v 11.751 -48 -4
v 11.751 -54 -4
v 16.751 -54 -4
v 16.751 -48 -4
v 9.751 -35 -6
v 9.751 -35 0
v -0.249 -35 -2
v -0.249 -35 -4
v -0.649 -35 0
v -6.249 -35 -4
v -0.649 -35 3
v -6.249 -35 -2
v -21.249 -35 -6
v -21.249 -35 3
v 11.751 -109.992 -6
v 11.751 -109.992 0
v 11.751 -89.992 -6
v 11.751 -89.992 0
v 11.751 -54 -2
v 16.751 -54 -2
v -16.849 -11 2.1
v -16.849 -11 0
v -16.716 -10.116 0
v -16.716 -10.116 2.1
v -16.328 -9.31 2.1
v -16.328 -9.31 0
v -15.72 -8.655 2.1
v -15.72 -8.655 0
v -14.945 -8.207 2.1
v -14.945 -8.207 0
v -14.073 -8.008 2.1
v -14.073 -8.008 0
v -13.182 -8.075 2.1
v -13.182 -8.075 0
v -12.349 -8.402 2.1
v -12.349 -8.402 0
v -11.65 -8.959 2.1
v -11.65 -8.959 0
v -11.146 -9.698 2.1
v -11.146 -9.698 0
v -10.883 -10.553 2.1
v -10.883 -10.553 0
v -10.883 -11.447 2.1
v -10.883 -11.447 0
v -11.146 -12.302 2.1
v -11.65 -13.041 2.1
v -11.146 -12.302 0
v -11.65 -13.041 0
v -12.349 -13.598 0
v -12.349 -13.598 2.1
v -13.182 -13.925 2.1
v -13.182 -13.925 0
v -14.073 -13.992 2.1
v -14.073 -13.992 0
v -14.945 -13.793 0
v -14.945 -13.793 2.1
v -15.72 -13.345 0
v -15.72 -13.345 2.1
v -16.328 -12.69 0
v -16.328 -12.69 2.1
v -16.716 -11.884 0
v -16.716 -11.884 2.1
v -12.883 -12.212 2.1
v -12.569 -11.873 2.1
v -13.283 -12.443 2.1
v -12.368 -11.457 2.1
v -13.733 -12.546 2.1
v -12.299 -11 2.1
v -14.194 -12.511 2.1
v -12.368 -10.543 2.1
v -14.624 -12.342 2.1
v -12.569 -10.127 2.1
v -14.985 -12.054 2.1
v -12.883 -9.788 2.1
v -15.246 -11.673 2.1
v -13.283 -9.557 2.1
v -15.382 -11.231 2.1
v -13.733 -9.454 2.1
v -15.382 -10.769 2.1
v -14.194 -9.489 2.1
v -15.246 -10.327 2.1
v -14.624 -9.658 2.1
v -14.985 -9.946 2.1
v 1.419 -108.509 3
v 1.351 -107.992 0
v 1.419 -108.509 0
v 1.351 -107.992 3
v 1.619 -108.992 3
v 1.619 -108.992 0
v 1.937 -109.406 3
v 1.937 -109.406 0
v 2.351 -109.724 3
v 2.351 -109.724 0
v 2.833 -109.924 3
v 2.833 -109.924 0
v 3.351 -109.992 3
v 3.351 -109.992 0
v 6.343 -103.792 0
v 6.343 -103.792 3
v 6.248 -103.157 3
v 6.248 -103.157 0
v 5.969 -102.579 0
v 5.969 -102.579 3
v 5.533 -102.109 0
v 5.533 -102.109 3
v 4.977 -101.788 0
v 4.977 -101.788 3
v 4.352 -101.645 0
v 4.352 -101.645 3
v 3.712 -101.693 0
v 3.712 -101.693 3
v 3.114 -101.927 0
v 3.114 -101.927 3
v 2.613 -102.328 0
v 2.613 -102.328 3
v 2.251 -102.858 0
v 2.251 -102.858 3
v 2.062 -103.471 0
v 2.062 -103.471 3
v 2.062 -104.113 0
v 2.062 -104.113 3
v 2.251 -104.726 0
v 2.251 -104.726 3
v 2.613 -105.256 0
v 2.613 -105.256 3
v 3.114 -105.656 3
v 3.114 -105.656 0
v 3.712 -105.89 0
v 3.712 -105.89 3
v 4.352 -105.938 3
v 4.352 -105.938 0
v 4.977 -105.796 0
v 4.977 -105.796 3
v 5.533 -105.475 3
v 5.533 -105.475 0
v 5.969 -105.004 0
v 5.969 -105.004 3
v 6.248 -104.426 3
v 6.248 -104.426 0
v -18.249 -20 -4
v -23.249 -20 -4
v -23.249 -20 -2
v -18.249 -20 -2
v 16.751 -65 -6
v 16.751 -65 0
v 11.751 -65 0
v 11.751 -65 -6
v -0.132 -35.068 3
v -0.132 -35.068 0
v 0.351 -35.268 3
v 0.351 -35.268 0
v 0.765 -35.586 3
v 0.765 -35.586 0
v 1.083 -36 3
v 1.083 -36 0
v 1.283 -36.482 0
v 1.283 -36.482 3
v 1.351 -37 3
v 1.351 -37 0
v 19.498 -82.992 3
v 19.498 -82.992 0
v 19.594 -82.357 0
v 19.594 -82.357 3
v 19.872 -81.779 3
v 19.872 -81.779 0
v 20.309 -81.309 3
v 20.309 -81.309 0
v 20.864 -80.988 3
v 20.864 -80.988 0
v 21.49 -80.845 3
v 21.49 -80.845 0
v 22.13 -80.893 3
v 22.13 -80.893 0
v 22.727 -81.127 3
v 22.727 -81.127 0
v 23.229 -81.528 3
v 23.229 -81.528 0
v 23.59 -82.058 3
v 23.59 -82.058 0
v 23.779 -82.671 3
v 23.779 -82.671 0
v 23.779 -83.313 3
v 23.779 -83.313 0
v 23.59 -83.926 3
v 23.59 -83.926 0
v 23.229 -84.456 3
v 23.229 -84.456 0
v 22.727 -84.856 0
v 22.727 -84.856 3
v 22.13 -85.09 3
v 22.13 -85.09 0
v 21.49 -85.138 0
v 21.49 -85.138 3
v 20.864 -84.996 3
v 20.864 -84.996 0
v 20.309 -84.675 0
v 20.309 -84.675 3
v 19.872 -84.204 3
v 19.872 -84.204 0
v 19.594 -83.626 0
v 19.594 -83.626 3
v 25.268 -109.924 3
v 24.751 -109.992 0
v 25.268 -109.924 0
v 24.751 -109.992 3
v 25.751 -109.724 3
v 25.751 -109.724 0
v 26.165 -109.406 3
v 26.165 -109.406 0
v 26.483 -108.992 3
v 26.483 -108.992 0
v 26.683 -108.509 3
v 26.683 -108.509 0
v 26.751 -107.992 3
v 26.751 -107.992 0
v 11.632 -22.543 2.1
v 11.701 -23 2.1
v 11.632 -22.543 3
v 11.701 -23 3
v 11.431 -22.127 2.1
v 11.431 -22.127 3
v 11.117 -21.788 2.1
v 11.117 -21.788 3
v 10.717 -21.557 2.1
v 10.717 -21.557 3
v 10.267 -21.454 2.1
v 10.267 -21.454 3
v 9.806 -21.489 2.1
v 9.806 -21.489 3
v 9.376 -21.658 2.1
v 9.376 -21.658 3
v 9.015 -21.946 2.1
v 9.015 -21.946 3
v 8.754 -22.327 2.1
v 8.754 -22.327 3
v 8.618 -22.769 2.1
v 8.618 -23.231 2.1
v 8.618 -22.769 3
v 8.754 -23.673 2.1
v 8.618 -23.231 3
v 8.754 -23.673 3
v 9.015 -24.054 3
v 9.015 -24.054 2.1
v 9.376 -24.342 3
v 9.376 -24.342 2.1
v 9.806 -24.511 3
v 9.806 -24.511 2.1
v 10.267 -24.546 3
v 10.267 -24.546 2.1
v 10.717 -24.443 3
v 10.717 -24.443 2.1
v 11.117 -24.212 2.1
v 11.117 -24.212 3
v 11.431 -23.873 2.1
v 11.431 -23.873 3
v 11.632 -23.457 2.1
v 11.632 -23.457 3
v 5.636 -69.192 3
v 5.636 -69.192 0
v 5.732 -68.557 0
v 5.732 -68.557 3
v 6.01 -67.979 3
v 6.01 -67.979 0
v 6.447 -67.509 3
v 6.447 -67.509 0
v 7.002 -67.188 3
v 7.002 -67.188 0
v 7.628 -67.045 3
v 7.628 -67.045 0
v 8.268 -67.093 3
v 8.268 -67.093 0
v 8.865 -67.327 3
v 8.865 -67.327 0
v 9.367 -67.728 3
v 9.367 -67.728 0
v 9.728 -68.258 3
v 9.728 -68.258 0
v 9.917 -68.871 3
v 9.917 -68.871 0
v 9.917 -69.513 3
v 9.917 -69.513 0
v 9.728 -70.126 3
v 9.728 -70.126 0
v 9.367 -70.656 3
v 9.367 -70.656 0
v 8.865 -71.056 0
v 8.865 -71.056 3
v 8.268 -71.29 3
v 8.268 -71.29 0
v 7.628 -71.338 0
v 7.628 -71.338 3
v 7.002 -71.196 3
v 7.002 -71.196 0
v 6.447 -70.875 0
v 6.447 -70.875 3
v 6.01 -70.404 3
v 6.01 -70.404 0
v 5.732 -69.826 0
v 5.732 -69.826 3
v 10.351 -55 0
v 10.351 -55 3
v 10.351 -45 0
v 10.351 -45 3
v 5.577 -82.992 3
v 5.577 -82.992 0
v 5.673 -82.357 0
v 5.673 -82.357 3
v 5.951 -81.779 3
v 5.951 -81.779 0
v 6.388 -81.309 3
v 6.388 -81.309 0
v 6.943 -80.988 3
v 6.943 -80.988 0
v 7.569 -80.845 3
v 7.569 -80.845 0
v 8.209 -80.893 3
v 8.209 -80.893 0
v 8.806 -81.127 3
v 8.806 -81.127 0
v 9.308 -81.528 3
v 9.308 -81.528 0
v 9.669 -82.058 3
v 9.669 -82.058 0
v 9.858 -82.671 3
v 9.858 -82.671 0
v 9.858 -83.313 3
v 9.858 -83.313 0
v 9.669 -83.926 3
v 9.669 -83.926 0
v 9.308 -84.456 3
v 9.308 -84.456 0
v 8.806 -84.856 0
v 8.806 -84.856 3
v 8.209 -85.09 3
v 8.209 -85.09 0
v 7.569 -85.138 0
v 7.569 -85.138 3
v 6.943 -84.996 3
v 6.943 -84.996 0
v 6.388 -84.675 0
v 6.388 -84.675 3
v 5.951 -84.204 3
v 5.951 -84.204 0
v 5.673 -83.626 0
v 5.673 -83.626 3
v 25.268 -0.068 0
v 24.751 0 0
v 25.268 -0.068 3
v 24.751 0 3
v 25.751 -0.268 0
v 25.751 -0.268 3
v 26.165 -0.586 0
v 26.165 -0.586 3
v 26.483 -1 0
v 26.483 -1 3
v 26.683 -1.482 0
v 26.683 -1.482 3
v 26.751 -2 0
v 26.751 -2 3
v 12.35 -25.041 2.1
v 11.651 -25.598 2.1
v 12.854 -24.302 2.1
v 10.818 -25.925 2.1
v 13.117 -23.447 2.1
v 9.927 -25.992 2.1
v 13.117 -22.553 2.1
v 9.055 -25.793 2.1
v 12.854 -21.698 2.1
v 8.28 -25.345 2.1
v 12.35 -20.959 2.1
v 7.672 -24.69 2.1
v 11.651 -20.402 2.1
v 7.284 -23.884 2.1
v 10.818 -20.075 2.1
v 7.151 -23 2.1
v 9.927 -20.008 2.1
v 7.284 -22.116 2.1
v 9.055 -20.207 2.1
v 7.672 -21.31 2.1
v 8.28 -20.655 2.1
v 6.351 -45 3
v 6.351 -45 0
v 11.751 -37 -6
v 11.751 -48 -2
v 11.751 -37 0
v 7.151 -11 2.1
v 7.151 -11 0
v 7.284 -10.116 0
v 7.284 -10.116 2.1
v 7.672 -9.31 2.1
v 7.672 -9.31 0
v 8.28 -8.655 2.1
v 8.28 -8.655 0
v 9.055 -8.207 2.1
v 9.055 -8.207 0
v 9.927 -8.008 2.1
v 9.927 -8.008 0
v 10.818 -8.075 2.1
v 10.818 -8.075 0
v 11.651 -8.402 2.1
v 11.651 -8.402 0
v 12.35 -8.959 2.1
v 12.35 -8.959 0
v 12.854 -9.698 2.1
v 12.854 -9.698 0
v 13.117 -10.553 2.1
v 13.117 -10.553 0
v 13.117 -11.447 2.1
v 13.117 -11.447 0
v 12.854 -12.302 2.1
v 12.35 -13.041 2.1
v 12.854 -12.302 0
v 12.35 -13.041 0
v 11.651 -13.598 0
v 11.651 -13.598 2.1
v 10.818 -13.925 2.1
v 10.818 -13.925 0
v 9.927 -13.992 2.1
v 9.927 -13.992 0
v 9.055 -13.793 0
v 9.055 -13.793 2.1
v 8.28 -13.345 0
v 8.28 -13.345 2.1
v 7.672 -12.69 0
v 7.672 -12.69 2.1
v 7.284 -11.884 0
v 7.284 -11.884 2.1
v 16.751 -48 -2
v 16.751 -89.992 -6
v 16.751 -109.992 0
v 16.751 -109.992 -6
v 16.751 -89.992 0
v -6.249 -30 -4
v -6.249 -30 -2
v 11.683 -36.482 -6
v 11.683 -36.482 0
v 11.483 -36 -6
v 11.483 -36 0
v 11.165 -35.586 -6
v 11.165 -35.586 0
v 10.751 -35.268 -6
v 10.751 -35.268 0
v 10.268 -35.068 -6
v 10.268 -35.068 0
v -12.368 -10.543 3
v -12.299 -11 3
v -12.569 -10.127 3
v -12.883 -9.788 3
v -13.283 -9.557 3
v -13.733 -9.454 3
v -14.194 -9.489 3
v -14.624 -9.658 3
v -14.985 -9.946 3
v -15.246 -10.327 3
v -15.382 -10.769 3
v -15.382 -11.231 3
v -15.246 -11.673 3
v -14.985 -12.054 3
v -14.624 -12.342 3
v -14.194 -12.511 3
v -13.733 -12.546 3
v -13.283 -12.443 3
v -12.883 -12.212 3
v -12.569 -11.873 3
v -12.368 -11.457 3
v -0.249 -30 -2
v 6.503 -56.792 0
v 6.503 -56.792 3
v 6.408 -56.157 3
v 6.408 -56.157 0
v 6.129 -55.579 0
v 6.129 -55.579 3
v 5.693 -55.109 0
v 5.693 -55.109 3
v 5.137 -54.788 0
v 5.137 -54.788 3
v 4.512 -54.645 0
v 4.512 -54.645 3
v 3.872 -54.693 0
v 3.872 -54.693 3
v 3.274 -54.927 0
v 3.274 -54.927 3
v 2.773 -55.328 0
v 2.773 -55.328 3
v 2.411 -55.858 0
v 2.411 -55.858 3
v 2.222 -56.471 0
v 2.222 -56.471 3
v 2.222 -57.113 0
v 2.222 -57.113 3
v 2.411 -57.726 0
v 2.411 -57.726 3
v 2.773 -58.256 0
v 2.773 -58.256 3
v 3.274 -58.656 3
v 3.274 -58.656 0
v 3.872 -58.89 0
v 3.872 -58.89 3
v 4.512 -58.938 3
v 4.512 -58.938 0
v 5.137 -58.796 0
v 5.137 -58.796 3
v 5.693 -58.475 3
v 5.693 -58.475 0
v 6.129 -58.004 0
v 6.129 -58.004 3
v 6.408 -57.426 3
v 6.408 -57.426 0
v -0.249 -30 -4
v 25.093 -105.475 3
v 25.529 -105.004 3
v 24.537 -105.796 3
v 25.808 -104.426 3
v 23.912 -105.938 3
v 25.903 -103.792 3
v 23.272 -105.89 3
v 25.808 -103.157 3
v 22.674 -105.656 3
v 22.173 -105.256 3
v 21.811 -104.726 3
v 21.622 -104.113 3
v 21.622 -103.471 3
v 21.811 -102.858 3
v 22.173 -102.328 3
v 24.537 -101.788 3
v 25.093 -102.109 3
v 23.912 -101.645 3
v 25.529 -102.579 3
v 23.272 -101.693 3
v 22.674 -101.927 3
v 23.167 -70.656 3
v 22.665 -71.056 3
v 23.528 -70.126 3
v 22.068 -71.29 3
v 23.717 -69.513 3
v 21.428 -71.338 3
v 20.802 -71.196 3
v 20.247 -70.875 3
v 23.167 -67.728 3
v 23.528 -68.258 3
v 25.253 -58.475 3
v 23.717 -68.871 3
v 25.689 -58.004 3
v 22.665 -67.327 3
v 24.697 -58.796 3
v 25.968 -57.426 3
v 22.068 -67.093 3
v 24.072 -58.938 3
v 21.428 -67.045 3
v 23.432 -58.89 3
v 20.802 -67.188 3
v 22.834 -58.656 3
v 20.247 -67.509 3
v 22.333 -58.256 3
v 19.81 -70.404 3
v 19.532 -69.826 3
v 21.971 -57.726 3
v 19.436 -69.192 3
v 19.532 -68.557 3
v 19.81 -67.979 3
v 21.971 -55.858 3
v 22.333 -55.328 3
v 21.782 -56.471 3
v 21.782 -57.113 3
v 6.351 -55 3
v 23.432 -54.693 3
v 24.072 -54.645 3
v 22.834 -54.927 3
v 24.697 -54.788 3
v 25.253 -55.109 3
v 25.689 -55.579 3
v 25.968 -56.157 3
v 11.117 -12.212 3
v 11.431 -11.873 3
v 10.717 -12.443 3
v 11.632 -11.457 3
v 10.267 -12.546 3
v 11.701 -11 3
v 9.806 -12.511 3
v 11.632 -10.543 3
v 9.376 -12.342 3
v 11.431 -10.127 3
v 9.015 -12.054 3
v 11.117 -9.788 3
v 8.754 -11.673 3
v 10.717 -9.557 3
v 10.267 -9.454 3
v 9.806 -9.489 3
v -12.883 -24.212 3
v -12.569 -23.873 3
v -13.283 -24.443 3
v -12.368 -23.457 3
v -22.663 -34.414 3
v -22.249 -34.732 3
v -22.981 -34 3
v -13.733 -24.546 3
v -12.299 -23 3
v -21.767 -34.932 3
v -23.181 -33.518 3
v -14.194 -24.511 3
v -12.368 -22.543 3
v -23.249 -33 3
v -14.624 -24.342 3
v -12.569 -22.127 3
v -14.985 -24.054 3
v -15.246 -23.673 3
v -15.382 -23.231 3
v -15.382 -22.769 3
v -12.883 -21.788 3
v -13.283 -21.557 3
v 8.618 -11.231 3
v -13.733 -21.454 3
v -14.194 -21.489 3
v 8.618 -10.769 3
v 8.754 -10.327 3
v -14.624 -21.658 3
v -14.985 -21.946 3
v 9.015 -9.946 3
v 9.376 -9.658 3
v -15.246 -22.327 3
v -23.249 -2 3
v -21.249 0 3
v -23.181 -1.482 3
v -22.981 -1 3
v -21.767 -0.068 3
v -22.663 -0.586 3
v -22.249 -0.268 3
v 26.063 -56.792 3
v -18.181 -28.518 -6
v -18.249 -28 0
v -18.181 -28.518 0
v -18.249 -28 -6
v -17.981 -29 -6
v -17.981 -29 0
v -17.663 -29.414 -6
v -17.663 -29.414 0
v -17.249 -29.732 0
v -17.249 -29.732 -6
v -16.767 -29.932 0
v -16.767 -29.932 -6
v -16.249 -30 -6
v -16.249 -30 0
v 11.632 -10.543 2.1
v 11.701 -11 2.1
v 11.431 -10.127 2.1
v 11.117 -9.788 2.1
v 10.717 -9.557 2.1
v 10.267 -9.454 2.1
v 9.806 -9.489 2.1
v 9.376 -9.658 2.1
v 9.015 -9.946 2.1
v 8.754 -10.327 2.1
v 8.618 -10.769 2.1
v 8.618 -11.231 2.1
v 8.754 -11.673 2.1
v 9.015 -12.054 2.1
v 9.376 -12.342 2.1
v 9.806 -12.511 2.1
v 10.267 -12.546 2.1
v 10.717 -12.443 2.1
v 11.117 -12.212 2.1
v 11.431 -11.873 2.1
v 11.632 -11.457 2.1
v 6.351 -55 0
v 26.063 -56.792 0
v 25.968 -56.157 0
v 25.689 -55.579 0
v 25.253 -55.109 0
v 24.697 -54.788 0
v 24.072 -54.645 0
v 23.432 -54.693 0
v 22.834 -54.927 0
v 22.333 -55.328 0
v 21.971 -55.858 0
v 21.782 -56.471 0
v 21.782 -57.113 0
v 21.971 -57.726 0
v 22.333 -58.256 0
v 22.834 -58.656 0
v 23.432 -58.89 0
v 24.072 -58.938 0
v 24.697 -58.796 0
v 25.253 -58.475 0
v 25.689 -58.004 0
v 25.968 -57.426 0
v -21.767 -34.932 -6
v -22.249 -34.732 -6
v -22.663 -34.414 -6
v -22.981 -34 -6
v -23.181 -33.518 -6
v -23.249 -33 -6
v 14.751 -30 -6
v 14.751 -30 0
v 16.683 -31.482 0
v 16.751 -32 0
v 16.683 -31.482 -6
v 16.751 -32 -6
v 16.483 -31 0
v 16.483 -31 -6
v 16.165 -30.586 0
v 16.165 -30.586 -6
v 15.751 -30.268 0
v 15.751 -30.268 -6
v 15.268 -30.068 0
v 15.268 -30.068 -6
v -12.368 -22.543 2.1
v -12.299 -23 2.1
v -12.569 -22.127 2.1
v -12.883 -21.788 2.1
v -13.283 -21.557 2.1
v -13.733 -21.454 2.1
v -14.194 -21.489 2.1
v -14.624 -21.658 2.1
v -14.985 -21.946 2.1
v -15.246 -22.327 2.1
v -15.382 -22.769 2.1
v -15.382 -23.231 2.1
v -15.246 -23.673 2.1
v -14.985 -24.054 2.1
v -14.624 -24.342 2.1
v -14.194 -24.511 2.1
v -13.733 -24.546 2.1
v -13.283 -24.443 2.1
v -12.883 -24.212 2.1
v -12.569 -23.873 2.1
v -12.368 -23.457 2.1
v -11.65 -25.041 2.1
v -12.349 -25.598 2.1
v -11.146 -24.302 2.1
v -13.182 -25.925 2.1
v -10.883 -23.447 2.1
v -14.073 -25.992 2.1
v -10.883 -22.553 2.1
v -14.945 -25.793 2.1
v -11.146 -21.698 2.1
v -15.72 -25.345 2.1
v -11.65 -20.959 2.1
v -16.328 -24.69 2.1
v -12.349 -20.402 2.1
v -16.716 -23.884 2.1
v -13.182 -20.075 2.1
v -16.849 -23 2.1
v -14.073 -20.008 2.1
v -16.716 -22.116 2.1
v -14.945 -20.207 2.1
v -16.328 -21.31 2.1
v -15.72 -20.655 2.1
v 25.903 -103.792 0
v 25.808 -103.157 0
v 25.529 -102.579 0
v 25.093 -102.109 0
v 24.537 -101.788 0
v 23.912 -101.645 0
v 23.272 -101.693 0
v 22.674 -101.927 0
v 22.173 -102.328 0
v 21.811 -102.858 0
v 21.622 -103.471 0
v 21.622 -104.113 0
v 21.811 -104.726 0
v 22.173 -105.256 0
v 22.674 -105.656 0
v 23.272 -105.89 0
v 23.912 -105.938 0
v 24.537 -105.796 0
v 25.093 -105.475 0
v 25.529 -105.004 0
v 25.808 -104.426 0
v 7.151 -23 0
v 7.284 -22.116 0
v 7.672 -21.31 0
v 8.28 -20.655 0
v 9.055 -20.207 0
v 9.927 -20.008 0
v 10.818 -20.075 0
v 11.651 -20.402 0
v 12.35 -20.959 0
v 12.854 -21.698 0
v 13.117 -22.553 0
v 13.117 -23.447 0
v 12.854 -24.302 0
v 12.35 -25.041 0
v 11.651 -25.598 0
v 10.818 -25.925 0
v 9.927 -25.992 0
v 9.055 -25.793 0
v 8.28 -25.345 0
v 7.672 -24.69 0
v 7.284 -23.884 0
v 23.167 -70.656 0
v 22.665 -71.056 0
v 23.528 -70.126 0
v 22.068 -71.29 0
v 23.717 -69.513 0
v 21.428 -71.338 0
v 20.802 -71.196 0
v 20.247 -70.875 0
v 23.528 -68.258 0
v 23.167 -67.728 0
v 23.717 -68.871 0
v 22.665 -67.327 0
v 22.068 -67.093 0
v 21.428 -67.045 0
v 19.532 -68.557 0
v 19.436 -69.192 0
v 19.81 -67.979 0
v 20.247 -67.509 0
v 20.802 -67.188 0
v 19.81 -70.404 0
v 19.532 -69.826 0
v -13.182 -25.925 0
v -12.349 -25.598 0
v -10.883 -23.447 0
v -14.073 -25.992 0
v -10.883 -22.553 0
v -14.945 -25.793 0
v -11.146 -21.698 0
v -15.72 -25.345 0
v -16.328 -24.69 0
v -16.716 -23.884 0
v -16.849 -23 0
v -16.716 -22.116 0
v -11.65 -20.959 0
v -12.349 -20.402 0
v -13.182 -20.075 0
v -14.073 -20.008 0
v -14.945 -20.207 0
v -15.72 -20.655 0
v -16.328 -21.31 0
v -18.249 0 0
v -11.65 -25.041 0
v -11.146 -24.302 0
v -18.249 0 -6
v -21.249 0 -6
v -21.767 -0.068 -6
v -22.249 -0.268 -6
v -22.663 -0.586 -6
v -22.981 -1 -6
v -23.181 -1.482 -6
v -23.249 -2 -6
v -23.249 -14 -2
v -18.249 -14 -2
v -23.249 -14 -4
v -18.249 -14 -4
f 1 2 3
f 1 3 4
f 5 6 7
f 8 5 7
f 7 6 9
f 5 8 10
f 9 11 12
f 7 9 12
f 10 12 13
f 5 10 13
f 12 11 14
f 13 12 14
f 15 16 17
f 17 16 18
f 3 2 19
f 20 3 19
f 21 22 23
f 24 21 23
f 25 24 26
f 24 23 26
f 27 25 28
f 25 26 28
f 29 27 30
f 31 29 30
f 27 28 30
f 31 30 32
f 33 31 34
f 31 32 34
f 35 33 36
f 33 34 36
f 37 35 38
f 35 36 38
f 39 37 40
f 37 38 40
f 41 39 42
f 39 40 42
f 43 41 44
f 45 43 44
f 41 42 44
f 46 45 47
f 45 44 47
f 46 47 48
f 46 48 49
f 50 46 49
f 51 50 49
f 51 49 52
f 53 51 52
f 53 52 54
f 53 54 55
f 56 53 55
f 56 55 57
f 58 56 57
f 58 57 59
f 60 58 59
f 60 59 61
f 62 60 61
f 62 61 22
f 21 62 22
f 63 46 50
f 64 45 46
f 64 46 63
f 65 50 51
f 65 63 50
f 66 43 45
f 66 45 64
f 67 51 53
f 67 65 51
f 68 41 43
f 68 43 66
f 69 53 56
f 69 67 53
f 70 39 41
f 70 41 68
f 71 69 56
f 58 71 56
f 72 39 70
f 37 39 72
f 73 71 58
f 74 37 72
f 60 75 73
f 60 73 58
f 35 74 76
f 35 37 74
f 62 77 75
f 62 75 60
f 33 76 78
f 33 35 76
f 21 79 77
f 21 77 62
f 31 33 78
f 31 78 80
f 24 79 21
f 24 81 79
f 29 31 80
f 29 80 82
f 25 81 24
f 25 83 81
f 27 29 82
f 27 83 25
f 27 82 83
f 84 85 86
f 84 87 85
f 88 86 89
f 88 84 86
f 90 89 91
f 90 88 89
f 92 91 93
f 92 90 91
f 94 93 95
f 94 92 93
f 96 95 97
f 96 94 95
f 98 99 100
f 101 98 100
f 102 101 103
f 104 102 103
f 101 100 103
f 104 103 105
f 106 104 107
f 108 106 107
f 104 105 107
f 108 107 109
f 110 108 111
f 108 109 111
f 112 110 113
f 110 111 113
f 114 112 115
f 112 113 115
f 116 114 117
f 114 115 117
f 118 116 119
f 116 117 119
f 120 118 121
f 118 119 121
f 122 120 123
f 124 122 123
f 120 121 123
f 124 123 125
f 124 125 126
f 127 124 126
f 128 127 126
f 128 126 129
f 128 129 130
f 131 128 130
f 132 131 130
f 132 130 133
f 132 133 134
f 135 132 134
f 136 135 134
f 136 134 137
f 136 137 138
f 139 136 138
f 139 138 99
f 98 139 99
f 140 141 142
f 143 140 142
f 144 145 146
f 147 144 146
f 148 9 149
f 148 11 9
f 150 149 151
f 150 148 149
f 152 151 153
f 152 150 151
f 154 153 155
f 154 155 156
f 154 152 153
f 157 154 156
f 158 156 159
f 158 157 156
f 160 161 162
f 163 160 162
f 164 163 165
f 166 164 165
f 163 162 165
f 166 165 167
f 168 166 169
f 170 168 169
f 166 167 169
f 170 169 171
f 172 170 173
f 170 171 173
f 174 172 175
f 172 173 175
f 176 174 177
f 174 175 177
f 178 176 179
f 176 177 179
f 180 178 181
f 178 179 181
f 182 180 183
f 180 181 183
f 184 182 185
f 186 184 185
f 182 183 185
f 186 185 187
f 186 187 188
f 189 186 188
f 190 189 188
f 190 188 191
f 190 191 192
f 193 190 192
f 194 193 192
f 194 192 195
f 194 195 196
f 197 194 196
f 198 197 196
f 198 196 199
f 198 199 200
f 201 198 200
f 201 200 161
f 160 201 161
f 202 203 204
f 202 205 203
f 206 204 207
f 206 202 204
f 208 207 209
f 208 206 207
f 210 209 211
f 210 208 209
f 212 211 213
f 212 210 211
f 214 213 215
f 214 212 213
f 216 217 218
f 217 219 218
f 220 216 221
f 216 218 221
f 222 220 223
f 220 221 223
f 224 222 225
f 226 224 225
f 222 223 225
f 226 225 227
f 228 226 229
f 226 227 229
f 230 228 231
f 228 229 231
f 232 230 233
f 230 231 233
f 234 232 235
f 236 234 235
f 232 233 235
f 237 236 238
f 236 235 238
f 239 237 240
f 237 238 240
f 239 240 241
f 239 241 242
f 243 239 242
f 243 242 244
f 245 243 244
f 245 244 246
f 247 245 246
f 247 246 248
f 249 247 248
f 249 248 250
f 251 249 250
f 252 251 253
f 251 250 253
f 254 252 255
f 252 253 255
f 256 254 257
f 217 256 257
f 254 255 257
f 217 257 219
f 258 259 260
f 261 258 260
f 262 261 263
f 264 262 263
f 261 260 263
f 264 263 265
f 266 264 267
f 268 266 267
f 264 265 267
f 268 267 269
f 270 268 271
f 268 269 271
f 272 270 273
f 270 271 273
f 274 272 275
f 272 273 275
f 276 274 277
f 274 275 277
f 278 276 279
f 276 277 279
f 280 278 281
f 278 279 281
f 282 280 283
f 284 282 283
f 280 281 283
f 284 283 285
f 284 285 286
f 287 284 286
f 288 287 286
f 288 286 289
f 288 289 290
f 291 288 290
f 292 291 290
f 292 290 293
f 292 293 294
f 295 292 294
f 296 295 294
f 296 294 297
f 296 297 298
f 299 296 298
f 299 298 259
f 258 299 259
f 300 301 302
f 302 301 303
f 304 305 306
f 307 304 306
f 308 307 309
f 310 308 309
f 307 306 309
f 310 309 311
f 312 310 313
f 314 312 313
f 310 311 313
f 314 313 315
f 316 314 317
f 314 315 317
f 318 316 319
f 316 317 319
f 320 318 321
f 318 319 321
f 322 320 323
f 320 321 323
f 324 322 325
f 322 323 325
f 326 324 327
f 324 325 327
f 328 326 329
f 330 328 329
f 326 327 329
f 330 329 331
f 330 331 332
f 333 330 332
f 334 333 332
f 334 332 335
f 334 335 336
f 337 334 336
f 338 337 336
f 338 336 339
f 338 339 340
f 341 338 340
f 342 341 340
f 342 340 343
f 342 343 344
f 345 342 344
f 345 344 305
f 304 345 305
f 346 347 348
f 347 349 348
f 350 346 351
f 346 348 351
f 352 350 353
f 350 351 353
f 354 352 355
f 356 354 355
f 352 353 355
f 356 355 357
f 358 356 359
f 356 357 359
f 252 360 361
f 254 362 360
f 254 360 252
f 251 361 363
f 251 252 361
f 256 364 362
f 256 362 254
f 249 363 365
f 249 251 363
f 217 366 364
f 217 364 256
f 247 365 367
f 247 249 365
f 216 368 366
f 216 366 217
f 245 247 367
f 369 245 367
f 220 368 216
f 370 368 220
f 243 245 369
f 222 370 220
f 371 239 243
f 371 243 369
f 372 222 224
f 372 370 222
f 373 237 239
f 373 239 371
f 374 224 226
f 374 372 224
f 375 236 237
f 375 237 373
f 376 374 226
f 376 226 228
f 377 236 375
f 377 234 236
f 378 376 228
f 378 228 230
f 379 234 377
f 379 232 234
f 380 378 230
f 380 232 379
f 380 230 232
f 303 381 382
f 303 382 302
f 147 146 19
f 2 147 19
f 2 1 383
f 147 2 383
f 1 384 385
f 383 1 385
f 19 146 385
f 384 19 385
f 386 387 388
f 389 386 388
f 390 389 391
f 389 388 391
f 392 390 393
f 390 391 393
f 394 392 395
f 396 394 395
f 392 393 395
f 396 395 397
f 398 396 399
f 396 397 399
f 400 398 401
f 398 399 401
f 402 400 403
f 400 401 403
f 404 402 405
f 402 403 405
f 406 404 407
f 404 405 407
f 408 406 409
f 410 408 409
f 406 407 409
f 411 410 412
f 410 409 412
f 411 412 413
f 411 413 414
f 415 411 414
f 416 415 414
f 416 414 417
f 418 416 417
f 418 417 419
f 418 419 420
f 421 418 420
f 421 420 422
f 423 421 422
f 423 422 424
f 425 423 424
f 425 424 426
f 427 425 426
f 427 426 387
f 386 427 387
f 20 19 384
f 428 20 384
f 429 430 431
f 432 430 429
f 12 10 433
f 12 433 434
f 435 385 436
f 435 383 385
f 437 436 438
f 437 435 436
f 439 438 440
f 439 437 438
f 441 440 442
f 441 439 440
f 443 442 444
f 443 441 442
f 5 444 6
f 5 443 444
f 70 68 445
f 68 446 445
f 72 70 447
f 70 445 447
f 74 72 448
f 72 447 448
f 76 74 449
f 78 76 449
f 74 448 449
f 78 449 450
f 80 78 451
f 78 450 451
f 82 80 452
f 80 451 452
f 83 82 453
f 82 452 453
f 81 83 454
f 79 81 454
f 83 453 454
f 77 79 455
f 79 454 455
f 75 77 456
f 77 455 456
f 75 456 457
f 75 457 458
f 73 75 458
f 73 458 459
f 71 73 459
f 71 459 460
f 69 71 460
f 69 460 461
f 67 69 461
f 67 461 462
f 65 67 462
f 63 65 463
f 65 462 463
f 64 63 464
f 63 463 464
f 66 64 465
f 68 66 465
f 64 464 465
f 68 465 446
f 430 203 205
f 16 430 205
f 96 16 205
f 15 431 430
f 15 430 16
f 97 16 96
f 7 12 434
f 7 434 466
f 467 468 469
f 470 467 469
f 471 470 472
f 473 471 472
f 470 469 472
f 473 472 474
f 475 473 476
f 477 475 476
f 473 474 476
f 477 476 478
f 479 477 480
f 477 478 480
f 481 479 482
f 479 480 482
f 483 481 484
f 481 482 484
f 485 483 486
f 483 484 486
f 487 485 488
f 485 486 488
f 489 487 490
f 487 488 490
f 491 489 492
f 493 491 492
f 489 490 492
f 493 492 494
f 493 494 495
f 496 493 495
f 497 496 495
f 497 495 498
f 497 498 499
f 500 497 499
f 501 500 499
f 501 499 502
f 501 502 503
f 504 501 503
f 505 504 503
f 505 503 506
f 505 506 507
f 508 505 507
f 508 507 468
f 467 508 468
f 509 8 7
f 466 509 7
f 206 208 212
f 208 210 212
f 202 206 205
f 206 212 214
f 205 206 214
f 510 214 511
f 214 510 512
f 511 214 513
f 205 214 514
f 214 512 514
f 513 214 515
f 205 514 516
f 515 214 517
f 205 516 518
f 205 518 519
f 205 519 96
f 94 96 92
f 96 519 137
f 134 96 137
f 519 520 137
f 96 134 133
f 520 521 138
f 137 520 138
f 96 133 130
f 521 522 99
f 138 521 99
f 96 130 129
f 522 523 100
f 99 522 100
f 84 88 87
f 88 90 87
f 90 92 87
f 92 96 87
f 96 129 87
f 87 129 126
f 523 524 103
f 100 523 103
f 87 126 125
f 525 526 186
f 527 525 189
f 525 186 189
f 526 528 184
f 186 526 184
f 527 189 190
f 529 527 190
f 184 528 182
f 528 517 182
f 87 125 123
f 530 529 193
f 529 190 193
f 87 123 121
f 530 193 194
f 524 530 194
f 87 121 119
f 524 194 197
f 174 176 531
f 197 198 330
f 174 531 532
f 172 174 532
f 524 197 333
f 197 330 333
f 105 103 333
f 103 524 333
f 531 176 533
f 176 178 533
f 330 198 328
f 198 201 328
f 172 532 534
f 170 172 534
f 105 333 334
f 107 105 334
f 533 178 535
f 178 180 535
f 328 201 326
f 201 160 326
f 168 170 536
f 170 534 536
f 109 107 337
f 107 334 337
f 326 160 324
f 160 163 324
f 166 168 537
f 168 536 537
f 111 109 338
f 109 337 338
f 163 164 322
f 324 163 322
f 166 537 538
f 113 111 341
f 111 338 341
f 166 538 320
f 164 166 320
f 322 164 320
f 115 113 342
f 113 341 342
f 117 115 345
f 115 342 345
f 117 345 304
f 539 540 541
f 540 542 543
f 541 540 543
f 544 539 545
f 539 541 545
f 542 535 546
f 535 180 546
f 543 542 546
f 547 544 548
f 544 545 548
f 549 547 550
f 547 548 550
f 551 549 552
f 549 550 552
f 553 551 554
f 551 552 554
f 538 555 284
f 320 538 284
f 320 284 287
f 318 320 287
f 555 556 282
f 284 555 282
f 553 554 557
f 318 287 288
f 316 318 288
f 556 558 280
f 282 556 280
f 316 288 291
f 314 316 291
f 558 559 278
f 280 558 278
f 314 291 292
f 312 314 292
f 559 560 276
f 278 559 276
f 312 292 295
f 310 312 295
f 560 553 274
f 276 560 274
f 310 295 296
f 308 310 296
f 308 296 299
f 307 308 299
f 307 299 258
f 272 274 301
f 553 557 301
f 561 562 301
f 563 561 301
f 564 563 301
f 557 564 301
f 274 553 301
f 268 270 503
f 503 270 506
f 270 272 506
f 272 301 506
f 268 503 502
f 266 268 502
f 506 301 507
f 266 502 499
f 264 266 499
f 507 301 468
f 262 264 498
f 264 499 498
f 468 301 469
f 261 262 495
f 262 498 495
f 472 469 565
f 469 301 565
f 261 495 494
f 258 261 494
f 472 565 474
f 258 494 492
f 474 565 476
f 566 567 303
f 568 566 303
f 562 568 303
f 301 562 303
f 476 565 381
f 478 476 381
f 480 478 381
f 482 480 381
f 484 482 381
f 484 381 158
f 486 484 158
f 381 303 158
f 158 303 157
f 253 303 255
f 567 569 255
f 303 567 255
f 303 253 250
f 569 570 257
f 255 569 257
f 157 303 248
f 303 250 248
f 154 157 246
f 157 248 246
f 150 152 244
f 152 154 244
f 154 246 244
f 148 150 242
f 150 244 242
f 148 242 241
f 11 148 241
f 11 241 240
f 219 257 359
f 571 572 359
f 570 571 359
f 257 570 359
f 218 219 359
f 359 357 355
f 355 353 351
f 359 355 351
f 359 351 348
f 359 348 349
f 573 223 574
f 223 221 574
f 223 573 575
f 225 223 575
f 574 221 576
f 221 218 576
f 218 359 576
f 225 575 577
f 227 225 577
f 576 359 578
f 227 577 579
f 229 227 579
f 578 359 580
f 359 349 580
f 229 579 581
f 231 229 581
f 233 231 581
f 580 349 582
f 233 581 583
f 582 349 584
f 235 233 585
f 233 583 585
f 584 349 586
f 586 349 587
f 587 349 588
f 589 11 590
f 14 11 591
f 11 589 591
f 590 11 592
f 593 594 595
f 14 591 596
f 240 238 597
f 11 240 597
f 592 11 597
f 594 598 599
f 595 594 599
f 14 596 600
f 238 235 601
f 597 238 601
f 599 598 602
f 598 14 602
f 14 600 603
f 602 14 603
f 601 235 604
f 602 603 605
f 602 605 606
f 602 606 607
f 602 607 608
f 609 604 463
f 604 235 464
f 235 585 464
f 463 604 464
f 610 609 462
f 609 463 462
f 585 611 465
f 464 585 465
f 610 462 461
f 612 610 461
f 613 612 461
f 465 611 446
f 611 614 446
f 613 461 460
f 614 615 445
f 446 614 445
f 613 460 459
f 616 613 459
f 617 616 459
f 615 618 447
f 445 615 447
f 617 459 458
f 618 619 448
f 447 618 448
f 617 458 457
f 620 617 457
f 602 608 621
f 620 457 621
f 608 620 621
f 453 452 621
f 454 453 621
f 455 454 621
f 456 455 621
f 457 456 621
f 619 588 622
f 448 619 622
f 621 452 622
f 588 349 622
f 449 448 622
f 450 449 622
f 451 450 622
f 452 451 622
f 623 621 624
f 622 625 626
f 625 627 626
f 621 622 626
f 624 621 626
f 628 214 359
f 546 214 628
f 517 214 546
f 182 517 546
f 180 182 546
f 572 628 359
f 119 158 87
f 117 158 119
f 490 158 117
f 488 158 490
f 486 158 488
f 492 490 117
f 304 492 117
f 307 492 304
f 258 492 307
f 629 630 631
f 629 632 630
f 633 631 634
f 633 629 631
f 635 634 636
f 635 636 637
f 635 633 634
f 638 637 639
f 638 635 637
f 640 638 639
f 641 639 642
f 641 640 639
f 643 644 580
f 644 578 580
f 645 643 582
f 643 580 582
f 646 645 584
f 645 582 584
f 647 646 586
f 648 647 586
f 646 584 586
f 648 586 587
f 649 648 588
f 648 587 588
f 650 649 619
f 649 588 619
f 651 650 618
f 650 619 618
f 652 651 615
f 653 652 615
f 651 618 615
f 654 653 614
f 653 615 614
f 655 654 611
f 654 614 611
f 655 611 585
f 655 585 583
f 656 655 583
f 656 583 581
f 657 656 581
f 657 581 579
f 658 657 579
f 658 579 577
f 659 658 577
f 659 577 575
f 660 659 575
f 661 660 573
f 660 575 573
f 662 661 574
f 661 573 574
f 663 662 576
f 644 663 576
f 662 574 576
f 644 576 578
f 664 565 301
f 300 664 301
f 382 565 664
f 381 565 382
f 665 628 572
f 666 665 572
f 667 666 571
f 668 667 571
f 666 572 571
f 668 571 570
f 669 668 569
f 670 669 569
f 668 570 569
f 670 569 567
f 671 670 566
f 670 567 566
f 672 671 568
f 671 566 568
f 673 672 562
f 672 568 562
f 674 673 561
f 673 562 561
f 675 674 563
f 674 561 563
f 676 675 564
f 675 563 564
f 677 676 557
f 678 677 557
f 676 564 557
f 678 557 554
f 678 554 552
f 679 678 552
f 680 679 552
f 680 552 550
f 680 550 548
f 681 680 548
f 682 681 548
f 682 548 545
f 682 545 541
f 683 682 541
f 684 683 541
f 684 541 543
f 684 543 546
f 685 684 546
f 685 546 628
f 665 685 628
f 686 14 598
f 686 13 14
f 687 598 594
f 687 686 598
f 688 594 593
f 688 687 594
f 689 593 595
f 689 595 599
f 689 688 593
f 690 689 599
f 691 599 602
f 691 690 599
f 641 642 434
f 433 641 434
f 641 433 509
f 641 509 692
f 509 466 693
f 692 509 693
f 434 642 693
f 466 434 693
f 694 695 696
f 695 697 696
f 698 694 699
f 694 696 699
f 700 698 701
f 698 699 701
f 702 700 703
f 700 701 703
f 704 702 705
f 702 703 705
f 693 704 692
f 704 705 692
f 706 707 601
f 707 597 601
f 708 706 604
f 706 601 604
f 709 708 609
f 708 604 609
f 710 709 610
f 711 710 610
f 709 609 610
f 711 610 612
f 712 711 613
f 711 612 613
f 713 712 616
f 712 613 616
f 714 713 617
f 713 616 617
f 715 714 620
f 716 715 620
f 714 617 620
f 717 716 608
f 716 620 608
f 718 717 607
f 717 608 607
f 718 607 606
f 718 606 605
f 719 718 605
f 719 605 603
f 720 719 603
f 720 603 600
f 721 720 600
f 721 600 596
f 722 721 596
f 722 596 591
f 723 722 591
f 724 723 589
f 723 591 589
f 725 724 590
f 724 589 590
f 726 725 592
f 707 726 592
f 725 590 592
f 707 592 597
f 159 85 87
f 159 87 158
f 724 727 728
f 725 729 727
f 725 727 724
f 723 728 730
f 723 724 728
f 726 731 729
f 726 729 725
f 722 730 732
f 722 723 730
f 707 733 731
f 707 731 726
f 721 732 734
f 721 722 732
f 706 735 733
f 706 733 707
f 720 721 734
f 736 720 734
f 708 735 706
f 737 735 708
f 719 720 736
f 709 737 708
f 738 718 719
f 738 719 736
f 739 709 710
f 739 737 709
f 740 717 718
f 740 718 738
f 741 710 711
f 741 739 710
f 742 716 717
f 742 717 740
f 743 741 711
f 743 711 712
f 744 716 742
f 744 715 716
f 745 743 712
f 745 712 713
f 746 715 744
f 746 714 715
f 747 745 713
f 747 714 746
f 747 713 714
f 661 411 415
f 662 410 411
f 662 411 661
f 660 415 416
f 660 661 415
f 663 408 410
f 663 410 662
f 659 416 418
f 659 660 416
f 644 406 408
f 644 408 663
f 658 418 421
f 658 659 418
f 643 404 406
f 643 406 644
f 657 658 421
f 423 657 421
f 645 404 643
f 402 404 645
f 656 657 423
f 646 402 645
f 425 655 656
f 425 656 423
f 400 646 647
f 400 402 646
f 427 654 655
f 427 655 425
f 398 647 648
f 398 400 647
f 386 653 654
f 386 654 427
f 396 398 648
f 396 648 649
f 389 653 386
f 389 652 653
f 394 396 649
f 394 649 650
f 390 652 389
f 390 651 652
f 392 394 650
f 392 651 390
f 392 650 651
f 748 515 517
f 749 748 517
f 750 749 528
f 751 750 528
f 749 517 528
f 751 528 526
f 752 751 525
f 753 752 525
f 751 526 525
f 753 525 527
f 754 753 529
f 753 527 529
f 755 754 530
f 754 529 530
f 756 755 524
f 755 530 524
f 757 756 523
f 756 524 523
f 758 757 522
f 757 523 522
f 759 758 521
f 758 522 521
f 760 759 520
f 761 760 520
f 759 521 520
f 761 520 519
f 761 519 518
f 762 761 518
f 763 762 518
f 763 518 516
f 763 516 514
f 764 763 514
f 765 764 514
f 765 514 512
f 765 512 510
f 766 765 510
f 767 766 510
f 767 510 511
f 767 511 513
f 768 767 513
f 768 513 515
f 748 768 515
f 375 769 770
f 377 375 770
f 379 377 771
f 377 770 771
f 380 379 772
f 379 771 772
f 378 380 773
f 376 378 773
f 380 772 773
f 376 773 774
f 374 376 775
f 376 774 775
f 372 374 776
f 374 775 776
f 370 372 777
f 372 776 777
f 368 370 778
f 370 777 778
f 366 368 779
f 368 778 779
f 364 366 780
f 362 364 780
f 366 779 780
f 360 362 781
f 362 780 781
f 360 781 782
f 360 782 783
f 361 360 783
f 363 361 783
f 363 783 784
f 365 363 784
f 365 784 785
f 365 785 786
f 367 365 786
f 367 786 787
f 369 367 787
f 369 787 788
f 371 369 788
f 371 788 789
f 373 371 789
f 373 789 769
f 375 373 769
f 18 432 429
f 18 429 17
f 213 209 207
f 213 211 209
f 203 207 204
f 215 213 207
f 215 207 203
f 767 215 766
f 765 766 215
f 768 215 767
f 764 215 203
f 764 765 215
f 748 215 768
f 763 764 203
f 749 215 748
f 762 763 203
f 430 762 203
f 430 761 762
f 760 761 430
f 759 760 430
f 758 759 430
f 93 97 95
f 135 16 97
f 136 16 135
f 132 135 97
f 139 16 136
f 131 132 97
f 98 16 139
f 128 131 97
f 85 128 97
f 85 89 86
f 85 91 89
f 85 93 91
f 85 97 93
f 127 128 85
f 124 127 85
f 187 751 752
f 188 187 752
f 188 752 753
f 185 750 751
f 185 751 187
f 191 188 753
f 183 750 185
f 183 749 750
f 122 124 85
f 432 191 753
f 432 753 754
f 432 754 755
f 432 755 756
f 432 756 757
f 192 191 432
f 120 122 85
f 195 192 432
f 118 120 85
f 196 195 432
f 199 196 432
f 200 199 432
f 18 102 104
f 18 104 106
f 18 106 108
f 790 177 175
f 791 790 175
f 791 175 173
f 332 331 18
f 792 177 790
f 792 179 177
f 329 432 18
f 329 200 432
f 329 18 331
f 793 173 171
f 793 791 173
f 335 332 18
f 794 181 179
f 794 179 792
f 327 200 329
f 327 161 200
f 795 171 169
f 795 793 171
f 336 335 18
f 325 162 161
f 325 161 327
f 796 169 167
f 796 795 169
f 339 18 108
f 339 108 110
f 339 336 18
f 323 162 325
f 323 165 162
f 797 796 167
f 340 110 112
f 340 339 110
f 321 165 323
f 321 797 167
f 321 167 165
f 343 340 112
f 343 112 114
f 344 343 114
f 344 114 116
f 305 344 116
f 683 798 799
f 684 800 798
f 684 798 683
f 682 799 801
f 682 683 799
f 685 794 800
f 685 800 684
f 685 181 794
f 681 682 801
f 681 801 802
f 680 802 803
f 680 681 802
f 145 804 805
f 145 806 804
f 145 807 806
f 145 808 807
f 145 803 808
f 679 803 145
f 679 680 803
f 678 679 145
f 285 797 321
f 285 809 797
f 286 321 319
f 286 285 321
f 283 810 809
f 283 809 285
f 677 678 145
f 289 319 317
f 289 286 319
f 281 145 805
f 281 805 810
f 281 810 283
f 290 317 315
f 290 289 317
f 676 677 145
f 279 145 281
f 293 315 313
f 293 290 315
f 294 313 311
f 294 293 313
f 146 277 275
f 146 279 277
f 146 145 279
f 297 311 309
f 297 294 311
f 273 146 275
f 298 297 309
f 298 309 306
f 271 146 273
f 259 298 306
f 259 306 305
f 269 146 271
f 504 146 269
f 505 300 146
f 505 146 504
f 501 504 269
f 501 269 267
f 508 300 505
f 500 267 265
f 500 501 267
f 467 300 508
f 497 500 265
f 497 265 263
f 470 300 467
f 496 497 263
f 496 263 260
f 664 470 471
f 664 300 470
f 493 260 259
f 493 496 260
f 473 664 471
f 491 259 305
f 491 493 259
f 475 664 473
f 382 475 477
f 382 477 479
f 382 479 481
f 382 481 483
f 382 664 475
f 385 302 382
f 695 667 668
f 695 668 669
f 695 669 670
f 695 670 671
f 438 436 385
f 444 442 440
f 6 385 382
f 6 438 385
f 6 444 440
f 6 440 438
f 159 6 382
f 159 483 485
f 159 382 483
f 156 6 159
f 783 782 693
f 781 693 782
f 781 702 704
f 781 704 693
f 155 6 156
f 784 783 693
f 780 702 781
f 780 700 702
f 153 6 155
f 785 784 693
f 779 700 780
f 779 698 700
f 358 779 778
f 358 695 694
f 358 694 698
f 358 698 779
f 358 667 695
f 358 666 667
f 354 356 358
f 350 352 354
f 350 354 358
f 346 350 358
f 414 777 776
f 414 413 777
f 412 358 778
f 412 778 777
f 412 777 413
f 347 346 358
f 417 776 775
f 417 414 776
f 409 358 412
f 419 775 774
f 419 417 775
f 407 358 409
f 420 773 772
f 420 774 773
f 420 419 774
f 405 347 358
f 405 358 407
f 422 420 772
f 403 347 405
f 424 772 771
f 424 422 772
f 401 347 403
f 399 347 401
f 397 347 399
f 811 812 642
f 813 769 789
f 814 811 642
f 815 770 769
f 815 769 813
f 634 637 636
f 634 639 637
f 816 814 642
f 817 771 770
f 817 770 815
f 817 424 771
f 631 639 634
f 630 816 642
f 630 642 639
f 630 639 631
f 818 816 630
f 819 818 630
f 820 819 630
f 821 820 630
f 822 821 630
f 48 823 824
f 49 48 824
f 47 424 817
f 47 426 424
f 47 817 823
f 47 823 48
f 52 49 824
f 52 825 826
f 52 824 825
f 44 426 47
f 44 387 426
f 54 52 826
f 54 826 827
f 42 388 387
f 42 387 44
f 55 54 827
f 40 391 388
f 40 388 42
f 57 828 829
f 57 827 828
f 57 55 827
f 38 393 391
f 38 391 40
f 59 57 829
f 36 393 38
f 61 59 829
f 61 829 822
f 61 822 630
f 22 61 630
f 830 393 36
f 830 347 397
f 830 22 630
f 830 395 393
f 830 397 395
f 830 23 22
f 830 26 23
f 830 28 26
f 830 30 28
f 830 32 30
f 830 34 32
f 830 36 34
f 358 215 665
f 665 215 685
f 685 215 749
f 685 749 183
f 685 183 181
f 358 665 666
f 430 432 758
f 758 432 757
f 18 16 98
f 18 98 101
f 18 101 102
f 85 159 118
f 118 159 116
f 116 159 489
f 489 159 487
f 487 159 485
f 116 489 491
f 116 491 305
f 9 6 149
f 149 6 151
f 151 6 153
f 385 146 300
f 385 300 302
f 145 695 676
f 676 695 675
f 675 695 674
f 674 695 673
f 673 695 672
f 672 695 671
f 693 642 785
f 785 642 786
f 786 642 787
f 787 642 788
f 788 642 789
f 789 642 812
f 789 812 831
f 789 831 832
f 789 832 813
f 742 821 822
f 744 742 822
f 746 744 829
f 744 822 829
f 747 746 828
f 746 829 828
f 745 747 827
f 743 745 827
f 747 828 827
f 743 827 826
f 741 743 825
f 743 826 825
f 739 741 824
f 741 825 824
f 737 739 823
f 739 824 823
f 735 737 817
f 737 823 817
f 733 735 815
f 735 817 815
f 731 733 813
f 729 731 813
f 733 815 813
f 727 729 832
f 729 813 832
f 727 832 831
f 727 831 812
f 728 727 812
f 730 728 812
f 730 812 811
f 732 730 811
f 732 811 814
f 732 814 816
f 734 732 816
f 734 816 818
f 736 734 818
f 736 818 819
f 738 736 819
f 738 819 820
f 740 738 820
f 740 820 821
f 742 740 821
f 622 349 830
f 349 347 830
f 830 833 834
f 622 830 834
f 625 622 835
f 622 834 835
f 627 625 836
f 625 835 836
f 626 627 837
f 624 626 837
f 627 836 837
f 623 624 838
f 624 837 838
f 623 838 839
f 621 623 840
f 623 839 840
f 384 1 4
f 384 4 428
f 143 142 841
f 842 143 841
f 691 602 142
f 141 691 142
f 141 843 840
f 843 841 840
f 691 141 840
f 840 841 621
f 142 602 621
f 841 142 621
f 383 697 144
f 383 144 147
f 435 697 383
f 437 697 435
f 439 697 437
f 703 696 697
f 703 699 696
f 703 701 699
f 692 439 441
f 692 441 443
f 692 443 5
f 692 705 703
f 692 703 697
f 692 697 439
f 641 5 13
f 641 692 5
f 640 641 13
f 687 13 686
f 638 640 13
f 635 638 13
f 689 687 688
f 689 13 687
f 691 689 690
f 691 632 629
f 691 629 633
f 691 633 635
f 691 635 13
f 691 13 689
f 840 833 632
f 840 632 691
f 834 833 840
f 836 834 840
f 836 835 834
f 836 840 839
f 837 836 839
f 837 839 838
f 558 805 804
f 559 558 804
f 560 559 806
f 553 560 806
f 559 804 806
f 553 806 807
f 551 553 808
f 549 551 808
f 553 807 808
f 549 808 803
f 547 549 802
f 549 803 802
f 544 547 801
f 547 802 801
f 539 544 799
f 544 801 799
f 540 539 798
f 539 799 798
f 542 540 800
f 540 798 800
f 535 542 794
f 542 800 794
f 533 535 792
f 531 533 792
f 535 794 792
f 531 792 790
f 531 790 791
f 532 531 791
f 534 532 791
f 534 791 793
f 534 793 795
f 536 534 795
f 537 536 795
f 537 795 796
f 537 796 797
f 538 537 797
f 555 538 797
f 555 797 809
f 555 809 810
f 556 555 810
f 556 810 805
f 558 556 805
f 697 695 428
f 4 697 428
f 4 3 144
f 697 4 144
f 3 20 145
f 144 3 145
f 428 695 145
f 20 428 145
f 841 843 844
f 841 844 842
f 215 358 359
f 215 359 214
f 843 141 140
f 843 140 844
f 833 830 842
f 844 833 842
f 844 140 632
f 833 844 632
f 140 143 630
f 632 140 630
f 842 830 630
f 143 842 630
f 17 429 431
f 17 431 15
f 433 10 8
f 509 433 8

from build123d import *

# Parameters (mm, degrees)
BOSS_EXTRU_1_DEPTH                                 = 3
D_GAGEMENT_61_D                                    = 4.3053
CHAMBRAGE_POUR_VIS_T_TE_RONDE_BOMB_E_M_D           = 3.1
CHAMBRAGE_POUR_VIS_T_TE_RONDE_BOMB_E_M_CBORE_D     = 6
CHAMBRAGE_POUR_VIS_T_TE_RONDE_BOMB_E_M_CBORE_DEPTH = 2.1
ESQUISSE7_W                                        = 5
ESQUISSE7_H                                        = 20
BOSS_EXTRU_2_DEPTH                                 = 6
ENL_V_MAT_EXTRU_1_REACH                            = 117.582
ESQUISSE8_W                                        = 2
ESQUISSE8_H                                        = 6
ENL_V_MAT_EXTRU_2_REACH                            = 81.846
ESQUISSE9_W                                        = 6
ESQUISSE9_H                                        = 2
ENL_V_MAT_EXTRU_3_REACH                            = 122.972
ESQUISSE10_W                                       = 2
ESQUISSE10_H                                       = 6
CONG_1_R                                           = 2
D_GAGEMENT_65_D                                    = 4.3053
D_GAGEMENT_64_D                                    = 4.3053
ESQUISSE15_W                                       = 4
ESQUISSE15_H                                       = 10
ENL_V_MAT_EXTRU_4_DEPTH                            = 10


with BuildPart() as part:
    # Esquisse1 → Boss.-Extru.1 (new body)
    with BuildSketch(Plane.XY):
        Polygon((0, 0), (26.750817424, 0), (26.750817424, -109.991705561), (1.350817424, -109.991705561), (1.350817424, -35), (-23.249182576, -35), (-23.249182576, 0), align=None)
    extrude(amount=BOSS_EXTRU_1_DEPTH)

    # Dégagement #61 (through all)
    with Locations(Plane.XY.offset(3)):
        with Locations((21.588869509, -69.191705561), (7.788869509, -69.191705561), (7.729743851, -82.991705561), (21.650817424, -82.991705561)):
            Hole(D_GAGEMENT_61_D / 2)

    # Chambrage pour vis à tête ronde bombée M2.51 (through all)
    with Locations(Plane(origin=(0, 0, 0), x_dir=(-1, 0, 0), z_dir=(0, 0, -1))):
        with Locations((13.849182576, -23), (13.849182576, -11), (-10.150817424, -11), (-10.150817424, -23)):
            CounterBoreHole(CHAMBRAGE_POUR_VIS_T_TE_RONDE_BOMB_E_M_D / 2, CHAMBRAGE_POUR_VIS_T_TE_RONDE_BOMB_E_M_CBORE_D / 2, CHAMBRAGE_POUR_VIS_T_TE_RONDE_BOMB_E_M_CBORE_DEPTH)

    # Esquisse7 → Boss.-Extru.2 (add)
    with BuildSketch(Plane(origin=(0, 0, 0), x_dir=(-1, 0, 0), z_dir=(0, 0, -1))):
        Polygon((-11.750817424, -65), (-11.750817424, -35), (23.249182576, -35), (23.249182576, 0), (18.249182576, 0), (18.249182576, -30), (-16.750817424, -30), (-16.750817424, -65), align=None)
        with Locations((-14.250817424, -99.991705561)):
            Rectangle(ESQUISSE7_W, ESQUISSE7_H)
    extrude(amount=BOSS_EXTRU_2_DEPTH)

    # Esquisse8 → Enlèv. mat.-Extru.1 (cut, up to next)
    with BuildSketch(Plane.ZY.offset(-11.750817424), mode=Mode.PRIVATE) as enl_v_mat_extru_1_sk1:
        with Locations((-3, -51)):
            Rectangle(ESQUISSE8_W, ESQUISSE8_H)
    enl_v_mat_extru_1_tool1 = extrude(enl_v_mat_extru_1_sk1.sketch, amount=-ENL_V_MAT_EXTRU_1_REACH, mode=Mode.PRIVATE) & part.part
    add(enl_v_mat_extru_1_tool1.solids().sort_by_distance((11.750817, -51, -3))[0], mode=Mode.SUBTRACT)

    # Esquisse9 → Enlèv. mat.-Extru.2 (cut, up to next)
    with BuildSketch(Plane.XZ.offset(35), mode=Mode.PRIVATE) as enl_v_mat_extru_2_sk1:
        with Locations((-3.249182576, -3)):
            Rectangle(ESQUISSE9_W, ESQUISSE9_H)
    enl_v_mat_extru_2_tool1 = extrude(enl_v_mat_extru_2_sk1.sketch, amount=-ENL_V_MAT_EXTRU_2_REACH, mode=Mode.PRIVATE) & part.part
    add(enl_v_mat_extru_2_tool1.solids().sort_by_distance((-3.249183, -35, -3))[0], mode=Mode.SUBTRACT)

    # Esquisse10 → Enlèv. mat.-Extru.3 (cut, up to next)
    with BuildSketch(Plane.ZY.offset(23.249182576), mode=Mode.PRIVATE) as enl_v_mat_extru_3_sk1:
        with Locations((-3, -17)):
            Rectangle(ESQUISSE10_W, ESQUISSE10_H)
    enl_v_mat_extru_3_tool1 = extrude(enl_v_mat_extru_3_sk1.sketch, amount=-ENL_V_MAT_EXTRU_3_REACH, mode=Mode.PRIVATE) & part.part
    add(enl_v_mat_extru_3_tool1.solids().sort_by_distance((-23.249183, -17, -3))[0], mode=Mode.SUBTRACT)

    # Congé1
    cong_1_edges = [part.edges().sort_by_distance(p)[0] for p in [
        (26.750817424, 0, 1.5),
        (26.750817424, -109.991705561, 1.5),
        (1.350817424, -109.991705561, 1.5),
        (1.350817424, -35, 1.5),
        (-23.249182576, -35, -1.5),
        (-23.249182576, 0, -1.5),
        (-18.249182576, -30, -3),
        (16.750817424, -30, -3),
        (11.750817424, -35, -3),
    ]]
    fillet(cong_1_edges, radius=CONG_1_R)

    # Dégagement #65 (through all)
    with Locations(Plane(origin=(0, 0, 0), x_dir=(-1, 0, 0), z_dir=(0, 0, -1))):
        with Locations((-23.750817424, -103.791705561), (-4.190817424, -103.791705561)):
            Hole(D_GAGEMENT_65_D / 2)

    # Dégagement #64 (through all)
    with Locations(Plane(origin=(0, 0, 0), x_dir=(-1, 0, 0), z_dir=(0, 0, -1))):
        with Locations((-23.910817424, -56.791705561), (-4.350817424, -56.791705561)):
            Hole(D_GAGEMENT_64_D / 2)

    # Esquisse15 → Enlèv. mat.-Extru.4 (cut)
    with BuildSketch(Plane.XY.offset(3)):
        with Locations((8.350817424, -50)):
            Rectangle(ESQUISSE15_W, ESQUISSE15_H)
    extrude(amount=-ENL_V_MAT_EXTRU_4_DEPTH, mode=Mode.SUBTRACT)


solid = part.part
